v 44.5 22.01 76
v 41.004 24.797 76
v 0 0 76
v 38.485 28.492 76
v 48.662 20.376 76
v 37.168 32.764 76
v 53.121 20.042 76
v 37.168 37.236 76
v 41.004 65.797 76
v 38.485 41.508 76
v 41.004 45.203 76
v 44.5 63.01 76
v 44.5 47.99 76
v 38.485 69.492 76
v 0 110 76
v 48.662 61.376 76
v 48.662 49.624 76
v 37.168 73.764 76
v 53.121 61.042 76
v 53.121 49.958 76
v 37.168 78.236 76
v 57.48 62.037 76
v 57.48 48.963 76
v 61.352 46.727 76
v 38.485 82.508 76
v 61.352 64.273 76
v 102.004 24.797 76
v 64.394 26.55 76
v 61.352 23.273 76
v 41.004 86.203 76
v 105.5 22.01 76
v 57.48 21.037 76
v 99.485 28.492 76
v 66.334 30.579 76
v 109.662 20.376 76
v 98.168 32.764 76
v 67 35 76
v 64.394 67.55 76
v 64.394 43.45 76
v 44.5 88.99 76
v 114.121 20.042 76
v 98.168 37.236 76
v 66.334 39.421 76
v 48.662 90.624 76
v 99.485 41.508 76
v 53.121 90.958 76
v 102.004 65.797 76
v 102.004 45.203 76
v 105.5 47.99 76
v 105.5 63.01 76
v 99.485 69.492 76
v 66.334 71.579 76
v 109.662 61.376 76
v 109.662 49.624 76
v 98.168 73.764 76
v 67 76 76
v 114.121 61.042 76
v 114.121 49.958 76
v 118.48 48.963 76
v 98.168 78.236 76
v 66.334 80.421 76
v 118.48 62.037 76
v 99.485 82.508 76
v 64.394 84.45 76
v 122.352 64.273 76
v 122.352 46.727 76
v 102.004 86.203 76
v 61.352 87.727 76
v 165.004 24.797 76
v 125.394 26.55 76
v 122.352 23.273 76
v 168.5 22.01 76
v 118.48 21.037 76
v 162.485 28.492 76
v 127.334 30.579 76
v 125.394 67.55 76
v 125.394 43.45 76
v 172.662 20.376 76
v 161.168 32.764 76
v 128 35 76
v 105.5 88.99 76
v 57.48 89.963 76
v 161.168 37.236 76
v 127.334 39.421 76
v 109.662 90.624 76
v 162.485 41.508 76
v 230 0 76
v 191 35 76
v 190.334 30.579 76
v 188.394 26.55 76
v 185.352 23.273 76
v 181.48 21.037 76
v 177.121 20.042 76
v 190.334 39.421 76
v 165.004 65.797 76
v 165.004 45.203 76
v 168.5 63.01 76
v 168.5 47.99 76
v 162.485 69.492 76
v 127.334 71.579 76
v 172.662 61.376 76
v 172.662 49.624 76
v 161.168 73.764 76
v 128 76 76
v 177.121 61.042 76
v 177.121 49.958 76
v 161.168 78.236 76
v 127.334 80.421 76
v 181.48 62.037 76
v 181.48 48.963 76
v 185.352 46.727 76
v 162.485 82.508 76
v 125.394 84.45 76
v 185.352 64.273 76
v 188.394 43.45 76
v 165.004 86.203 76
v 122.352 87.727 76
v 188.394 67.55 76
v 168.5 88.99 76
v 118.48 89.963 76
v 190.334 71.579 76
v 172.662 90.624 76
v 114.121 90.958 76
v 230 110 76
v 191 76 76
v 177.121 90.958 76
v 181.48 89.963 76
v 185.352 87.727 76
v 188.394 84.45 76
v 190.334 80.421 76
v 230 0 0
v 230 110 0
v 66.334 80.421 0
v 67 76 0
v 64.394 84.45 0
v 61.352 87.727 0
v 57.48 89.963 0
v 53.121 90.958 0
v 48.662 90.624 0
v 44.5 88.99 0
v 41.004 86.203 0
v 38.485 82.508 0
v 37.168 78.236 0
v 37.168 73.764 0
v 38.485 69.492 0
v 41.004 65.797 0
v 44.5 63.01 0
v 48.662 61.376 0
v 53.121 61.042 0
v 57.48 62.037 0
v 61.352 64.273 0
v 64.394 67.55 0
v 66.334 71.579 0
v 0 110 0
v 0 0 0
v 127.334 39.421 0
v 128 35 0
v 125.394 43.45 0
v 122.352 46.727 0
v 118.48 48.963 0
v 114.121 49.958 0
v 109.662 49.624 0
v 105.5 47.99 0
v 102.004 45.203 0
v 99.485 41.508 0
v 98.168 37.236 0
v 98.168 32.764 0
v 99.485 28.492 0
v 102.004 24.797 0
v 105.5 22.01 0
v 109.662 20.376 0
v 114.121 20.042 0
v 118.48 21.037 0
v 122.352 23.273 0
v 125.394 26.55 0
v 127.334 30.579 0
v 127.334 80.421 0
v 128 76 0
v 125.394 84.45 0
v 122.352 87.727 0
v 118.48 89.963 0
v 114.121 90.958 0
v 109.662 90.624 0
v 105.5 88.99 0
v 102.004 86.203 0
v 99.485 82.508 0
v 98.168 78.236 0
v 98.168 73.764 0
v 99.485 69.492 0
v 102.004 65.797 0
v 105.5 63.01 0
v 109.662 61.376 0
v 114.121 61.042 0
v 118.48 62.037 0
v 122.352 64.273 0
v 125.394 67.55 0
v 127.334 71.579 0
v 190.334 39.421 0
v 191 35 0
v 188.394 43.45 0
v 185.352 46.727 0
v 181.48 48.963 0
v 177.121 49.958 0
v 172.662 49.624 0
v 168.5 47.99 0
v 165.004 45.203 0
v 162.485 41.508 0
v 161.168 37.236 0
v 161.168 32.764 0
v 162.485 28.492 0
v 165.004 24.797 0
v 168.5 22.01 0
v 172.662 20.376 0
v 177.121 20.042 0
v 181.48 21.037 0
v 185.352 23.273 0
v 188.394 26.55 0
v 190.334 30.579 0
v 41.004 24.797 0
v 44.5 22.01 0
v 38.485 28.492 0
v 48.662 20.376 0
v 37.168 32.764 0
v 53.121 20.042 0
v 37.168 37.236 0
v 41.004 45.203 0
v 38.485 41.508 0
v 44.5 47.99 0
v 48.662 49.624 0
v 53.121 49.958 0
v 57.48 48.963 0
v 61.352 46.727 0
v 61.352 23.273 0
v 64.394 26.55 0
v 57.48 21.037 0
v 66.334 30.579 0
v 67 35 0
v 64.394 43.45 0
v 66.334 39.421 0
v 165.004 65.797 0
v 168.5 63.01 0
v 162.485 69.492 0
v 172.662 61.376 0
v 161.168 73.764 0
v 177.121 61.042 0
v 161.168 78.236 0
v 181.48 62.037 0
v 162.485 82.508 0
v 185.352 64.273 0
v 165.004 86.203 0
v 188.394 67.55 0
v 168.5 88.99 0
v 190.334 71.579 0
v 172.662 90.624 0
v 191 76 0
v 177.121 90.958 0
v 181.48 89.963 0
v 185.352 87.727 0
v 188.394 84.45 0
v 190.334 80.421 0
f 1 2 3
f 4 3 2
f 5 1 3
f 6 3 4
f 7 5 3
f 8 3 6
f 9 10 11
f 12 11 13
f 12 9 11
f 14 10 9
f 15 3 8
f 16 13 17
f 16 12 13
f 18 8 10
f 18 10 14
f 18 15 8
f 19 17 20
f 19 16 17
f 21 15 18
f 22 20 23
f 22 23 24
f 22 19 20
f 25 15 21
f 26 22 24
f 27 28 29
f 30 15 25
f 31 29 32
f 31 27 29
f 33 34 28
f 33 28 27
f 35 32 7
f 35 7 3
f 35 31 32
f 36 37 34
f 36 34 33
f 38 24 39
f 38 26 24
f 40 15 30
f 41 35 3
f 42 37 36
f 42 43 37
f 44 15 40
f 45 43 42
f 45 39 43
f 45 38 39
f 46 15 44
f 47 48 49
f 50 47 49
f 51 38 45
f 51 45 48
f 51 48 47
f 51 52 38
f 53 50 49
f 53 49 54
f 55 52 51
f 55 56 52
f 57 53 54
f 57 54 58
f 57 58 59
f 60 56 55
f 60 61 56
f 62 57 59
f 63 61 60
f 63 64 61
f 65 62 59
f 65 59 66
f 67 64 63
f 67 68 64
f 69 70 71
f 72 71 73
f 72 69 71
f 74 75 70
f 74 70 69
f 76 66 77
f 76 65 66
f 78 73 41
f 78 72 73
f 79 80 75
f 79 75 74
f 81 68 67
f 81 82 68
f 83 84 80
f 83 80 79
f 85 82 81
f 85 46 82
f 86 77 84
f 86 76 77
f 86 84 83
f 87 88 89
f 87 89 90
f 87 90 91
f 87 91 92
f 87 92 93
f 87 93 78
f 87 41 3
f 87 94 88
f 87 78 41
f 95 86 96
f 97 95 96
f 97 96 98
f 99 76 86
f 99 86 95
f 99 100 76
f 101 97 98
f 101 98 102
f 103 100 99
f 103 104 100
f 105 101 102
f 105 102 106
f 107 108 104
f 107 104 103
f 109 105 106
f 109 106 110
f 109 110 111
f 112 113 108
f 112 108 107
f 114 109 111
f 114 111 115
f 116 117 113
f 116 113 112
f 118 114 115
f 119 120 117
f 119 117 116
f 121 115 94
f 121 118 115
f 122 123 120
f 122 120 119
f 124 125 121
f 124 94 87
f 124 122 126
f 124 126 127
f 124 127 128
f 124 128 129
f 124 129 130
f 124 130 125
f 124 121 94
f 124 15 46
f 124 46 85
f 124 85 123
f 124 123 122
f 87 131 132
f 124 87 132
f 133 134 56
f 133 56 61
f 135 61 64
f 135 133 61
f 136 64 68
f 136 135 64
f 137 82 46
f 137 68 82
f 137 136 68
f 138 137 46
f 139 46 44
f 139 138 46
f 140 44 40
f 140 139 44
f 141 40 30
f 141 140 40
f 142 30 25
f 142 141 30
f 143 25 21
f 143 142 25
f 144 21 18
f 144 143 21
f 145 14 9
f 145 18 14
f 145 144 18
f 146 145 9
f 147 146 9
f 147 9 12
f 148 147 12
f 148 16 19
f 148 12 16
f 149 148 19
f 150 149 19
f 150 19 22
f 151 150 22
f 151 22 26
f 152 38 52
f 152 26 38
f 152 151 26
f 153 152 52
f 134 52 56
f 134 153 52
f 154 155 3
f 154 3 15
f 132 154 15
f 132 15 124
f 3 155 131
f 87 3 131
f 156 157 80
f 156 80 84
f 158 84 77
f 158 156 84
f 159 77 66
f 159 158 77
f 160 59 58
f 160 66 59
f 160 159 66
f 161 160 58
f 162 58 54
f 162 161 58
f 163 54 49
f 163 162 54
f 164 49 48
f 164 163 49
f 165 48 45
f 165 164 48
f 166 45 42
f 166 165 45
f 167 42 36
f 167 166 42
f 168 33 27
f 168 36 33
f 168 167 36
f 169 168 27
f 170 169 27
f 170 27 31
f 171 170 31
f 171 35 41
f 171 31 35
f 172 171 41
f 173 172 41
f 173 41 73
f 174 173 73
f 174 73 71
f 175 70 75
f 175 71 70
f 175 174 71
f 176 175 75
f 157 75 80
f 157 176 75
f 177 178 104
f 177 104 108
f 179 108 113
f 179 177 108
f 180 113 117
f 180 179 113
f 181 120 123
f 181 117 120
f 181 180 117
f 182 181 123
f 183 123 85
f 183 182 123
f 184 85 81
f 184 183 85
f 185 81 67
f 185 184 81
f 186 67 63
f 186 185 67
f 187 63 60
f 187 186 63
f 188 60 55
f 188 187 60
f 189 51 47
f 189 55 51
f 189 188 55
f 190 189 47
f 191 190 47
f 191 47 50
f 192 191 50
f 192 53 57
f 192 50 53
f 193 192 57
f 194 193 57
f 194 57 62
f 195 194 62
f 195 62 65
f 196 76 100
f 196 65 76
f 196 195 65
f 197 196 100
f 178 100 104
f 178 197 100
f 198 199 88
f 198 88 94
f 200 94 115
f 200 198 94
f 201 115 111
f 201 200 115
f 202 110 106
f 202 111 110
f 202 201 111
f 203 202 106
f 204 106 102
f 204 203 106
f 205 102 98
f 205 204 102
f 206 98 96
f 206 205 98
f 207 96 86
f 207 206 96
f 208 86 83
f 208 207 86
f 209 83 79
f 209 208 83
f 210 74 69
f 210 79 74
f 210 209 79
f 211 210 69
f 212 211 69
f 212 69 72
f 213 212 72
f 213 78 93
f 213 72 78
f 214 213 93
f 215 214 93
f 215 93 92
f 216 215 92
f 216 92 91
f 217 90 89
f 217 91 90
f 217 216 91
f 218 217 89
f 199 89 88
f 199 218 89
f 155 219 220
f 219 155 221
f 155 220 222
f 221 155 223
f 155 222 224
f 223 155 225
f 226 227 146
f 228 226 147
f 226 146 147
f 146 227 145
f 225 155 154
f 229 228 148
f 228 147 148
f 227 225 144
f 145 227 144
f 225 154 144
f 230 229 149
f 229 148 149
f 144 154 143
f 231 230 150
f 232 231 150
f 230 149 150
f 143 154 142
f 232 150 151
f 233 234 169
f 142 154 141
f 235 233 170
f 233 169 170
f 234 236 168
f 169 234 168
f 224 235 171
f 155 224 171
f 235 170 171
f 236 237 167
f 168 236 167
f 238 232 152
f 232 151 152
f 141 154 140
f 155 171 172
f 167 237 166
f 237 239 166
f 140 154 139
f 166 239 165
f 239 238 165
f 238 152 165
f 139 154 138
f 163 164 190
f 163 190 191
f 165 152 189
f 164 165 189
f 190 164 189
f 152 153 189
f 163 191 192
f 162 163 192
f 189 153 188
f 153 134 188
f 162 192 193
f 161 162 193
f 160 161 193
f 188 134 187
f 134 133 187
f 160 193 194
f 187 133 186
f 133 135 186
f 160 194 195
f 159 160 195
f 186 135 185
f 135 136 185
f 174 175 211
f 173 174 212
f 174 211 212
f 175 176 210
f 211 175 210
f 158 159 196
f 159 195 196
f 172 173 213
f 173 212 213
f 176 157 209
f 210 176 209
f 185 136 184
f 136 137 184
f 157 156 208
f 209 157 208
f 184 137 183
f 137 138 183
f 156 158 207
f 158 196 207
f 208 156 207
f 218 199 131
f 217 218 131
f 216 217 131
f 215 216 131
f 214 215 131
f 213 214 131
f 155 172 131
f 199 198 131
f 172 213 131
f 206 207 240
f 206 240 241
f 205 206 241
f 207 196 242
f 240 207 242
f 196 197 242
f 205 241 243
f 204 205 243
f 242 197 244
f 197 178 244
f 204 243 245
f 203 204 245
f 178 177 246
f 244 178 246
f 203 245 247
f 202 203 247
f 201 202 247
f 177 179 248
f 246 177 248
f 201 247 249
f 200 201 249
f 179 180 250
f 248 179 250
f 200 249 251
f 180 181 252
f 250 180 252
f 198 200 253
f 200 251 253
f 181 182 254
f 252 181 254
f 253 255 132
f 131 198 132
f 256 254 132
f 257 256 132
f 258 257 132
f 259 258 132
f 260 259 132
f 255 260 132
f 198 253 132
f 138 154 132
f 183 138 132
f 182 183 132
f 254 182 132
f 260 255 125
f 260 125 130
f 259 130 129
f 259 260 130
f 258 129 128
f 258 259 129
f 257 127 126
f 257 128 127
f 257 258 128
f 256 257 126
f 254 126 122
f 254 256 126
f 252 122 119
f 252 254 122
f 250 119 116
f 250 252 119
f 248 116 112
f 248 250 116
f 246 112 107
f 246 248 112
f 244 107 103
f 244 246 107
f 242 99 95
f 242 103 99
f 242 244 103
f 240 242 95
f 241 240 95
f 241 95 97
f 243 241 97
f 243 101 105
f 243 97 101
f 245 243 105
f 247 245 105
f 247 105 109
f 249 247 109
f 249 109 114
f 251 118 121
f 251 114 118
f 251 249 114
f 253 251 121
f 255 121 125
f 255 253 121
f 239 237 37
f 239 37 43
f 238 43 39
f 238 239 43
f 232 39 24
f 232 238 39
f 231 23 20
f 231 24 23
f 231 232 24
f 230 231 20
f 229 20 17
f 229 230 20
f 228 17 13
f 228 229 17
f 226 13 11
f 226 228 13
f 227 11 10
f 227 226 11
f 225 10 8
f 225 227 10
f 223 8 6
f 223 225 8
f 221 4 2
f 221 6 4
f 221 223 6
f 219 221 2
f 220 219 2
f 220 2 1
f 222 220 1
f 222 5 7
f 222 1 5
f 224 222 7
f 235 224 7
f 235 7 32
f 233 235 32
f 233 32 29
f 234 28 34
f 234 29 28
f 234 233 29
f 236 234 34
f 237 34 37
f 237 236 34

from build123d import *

# Parameters (mm, degrees)
CYLINDER001_R     = 15
CYLINDER001_DEPTH = 82
CYLINDER002_R     = 15
CYLINDER002_DEPTH = 82
CYLINDER003_R     = 15
CYLINDER003_DEPTH = 82
CYLINDER004_R     = 15
CYLINDER004_DEPTH = 82
CYLINDER005_R     = 15
CYLINDER005_DEPTH = 82
CYLINDER_R        = 15
CYLINDER_DEPTH    = 82
BOX_W             = 230
BOX_H             = 110
BOX_DEPTH         = 76


with BuildPart() as cilindre001:
    # Cylinder001 → Cylinder001 (new body)
    with BuildSketch(Plane(origin=(176, 76, -4), x_dir=(1, 0, 0), z_dir=(0, 0, 1))):
        Circle(CYLINDER001_R)
    extrude(amount=CYLINDER001_DEPTH)


with BuildPart() as cilindre002:
    # Cylinder002 → Cylinder002 (new body)
    with BuildSketch(Plane(origin=(176, 35, -4), x_dir=(1, 0, 0), z_dir=(0, 0, 1))):
        Circle(CYLINDER002_R)
    extrude(amount=CYLINDER002_DEPTH)


with BuildPart() as cilindre003:
    # Cylinder003 → Cylinder003 (new body)
    with BuildSketch(Plane(origin=(113, 76, -4), x_dir=(1, 0, 0), z_dir=(0, 0, 1))):
        Circle(CYLINDER003_R)
    extrude(amount=CYLINDER003_DEPTH)


with BuildPart() as cilindre004:
    # Cylinder004 → Cylinder004 (new body)
    with BuildSketch(Plane(origin=(52, 35, -4), x_dir=(1, 0, 0), z_dir=(0, 0, 1))):
        Circle(CYLINDER004_R)
    extrude(amount=CYLINDER004_DEPTH)


with BuildPart() as cilindre005:
    # Cylinder005 → Cylinder005 (new body)
    with BuildSketch(Plane(origin=(52, 76, -4), x_dir=(1, 0, 0), z_dir=(0, 0, 1))):
        Circle(CYLINDER005_R)
    extrude(amount=CYLINDER005_DEPTH)


with BuildPart() as cilindre:
    # Cylinder → Cylinder (new body)
    with BuildSketch(Plane(origin=(113, 35, -4), x_dir=(1, 0, 0), z_dir=(0, 0, 1))):
        Circle(CYLINDER_R)
    extrude(amount=CYLINDER_DEPTH)


with BuildPart() as cut005:
    # Box → Box (new body)
    with BuildSketch(Plane.XY):
        with Locations((115, 55)):
            Rectangle(BOX_W, BOX_H)
    extrude(amount=BOX_DEPTH)

    # Cut: cut Cilindre
    add(cilindre.part, mode=Mode.SUBTRACT)

    # Cut001: cut Cilindre005
    add(cilindre005.part, mode=Mode.SUBTRACT)

    # Cut002: cut Cilindre004
    add(cilindre004.part, mode=Mode.SUBTRACT)

    # Cut003: cut Cilindre003
    add(cilindre003.part, mode=Mode.SUBTRACT)

    # Cut004: cut Cilindre002
    add(cilindre002.part, mode=Mode.SUBTRACT)

    # Cut005: cut Cilindre001
    add(cilindre001.part, mode=Mode.SUBTRACT)


solid = cut005.part
